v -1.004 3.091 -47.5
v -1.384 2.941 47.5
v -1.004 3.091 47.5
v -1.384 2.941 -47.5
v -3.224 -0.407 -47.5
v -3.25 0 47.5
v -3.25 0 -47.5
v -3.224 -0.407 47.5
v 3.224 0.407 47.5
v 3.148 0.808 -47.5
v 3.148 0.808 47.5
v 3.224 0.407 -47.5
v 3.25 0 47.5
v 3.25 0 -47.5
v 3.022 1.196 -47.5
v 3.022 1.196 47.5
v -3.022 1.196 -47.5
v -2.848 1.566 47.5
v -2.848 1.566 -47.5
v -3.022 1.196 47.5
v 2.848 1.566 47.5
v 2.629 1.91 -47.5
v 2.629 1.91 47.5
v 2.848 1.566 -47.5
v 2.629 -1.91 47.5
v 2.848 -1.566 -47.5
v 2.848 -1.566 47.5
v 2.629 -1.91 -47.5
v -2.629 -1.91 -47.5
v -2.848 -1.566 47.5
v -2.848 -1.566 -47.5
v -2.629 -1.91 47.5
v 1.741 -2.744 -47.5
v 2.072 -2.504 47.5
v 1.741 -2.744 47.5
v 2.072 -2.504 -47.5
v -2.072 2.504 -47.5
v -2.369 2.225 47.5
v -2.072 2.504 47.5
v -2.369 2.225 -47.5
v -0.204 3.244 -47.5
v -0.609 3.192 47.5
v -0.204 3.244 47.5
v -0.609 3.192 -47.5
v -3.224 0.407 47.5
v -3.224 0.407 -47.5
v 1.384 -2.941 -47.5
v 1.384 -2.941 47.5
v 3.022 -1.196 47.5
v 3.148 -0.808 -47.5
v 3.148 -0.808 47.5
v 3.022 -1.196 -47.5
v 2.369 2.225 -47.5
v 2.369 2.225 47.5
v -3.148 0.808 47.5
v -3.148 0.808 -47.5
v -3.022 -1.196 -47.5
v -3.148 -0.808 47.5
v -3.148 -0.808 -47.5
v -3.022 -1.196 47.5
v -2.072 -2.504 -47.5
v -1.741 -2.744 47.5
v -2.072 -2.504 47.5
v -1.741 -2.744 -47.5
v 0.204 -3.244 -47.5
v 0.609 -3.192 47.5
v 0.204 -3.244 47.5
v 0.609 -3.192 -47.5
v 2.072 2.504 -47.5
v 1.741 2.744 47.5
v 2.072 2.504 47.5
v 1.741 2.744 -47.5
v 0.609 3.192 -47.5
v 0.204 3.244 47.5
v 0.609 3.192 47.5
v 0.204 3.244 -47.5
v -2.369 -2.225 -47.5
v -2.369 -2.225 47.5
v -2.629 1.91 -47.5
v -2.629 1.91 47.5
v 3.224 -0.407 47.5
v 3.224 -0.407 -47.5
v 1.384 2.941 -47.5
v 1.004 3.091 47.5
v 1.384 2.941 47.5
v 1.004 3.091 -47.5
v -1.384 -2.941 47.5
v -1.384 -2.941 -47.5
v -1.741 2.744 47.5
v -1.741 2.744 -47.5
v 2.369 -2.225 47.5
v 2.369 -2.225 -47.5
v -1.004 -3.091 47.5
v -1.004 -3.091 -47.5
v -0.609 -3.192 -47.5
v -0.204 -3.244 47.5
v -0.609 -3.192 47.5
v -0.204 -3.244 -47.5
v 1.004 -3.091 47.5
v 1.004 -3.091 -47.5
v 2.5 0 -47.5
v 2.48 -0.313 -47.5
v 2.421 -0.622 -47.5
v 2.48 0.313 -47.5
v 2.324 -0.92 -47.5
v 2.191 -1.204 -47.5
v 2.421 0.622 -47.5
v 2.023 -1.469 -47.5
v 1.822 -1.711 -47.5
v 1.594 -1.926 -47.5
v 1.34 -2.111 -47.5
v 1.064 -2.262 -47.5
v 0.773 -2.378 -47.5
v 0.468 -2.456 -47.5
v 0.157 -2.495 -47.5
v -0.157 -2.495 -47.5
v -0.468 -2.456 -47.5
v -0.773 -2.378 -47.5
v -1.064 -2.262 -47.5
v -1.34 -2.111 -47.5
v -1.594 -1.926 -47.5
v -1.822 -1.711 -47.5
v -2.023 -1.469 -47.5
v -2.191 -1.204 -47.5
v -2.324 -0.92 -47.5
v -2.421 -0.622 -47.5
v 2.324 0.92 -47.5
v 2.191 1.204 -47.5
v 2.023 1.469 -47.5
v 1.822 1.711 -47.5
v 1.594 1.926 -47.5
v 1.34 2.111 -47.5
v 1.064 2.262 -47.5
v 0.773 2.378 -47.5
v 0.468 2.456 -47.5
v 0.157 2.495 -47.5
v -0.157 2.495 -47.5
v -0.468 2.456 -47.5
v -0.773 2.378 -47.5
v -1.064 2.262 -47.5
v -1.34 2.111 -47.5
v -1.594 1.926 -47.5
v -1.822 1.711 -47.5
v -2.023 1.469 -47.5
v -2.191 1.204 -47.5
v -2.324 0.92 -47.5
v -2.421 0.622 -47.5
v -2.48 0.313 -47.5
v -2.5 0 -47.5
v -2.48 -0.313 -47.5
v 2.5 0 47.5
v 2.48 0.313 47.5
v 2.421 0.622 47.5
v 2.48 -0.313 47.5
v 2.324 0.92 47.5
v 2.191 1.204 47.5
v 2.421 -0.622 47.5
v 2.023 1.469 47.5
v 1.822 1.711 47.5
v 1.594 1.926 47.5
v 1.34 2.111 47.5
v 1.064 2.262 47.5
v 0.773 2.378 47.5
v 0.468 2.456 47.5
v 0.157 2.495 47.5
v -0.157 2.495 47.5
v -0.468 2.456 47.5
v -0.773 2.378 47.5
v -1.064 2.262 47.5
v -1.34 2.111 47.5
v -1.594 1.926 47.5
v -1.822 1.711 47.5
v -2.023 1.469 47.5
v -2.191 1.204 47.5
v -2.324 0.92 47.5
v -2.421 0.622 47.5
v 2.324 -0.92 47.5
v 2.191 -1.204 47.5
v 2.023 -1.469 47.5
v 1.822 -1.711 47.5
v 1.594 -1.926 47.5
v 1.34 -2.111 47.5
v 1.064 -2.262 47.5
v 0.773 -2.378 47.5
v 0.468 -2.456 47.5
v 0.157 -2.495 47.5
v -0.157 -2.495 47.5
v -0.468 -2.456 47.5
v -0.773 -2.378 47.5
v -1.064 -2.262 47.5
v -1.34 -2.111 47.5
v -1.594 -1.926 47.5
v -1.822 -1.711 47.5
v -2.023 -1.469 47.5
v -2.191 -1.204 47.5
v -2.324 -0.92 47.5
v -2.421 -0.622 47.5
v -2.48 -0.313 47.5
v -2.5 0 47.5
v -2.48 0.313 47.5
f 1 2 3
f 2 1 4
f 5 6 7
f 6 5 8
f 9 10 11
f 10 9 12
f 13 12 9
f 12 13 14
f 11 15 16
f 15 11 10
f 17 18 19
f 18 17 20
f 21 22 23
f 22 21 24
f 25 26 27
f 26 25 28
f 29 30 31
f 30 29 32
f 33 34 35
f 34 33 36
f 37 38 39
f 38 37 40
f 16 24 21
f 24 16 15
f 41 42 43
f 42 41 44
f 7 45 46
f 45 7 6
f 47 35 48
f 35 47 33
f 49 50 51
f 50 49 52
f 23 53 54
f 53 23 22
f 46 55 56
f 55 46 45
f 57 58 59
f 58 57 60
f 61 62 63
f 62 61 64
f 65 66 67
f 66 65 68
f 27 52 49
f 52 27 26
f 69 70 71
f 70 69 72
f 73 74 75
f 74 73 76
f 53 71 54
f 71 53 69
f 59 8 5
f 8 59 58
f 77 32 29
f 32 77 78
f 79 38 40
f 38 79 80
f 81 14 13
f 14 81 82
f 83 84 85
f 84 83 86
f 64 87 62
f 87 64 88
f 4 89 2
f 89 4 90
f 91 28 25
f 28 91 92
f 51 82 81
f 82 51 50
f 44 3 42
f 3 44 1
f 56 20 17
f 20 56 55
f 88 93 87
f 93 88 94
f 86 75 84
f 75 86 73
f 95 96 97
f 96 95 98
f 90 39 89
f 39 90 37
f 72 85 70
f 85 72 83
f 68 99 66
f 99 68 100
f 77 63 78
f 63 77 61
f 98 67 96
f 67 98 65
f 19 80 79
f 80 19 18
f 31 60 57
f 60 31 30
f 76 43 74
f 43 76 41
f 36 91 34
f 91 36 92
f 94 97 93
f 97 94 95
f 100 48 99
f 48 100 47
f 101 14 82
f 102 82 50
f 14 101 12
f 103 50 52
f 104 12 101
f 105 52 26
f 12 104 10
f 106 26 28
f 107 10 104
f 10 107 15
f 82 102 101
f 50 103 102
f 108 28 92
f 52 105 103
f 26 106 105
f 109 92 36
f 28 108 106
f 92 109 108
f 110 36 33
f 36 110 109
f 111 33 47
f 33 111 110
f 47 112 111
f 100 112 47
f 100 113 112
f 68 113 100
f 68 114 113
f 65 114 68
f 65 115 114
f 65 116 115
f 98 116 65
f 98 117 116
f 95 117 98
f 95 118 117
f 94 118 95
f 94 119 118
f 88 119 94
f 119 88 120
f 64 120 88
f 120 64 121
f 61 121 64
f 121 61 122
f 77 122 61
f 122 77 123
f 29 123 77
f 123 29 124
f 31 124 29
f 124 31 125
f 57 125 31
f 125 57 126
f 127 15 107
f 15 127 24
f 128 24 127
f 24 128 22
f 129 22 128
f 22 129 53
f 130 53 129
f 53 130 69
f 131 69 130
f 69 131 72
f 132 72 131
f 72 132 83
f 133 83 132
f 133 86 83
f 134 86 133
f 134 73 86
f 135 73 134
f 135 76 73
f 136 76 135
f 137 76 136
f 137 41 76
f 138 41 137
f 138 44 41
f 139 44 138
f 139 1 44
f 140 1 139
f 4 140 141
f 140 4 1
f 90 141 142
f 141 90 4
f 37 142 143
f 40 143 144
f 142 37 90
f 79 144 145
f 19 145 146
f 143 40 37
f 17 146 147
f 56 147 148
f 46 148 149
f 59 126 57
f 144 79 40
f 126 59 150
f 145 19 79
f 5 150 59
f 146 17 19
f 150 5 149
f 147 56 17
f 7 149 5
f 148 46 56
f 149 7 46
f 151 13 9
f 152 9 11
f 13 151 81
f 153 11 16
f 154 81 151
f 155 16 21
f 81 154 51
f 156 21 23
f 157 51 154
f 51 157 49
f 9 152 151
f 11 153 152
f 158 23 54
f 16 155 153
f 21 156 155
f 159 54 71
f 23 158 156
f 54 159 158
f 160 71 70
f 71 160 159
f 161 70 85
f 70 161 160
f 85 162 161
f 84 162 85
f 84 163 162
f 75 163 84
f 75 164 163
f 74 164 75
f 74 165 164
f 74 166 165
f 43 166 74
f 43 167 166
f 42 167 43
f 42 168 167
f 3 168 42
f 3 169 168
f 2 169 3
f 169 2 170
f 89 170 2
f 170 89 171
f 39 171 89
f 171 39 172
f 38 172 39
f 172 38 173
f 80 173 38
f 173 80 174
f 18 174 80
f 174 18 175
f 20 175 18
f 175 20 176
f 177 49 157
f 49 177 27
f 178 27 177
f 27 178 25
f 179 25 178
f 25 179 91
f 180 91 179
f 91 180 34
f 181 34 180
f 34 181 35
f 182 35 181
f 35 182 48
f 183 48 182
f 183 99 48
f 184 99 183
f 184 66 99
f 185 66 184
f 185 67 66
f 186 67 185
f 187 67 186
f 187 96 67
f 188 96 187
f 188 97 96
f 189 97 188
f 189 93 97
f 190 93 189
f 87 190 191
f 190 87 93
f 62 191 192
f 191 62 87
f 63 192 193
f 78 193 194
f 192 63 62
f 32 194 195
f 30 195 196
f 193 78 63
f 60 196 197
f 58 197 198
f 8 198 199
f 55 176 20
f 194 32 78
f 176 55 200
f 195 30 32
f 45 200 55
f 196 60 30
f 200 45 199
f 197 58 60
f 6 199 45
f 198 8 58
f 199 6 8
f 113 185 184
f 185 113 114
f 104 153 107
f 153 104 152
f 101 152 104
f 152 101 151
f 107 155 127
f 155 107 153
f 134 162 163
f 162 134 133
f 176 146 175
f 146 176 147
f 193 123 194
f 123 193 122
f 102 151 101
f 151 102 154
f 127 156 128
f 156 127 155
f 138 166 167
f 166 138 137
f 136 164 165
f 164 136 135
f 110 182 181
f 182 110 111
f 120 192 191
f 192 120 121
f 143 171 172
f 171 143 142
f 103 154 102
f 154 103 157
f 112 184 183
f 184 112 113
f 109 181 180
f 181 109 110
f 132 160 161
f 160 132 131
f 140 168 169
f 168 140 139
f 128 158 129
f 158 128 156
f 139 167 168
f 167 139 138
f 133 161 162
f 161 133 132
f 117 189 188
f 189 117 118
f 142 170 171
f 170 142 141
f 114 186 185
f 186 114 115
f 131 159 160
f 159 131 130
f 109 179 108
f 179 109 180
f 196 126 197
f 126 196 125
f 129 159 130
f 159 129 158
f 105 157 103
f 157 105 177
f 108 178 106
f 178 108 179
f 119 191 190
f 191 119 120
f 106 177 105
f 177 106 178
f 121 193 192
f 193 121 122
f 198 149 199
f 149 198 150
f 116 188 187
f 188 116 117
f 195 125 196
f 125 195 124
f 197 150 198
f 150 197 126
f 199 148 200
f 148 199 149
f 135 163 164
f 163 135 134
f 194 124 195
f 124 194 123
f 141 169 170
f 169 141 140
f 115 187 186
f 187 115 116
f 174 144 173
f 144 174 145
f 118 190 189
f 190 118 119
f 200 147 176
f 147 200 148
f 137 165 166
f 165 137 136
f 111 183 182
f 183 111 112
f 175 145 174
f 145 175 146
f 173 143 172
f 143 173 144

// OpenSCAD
$fn = 50;


difference() {
	union() {
		translate(v = [0, 0, -47.5000000000]) {
			cylinder(h = 95, r = 3.2500000000);
		}
	}
	union() {
		translate(v = [0, 0, -100.0000000000]) {
			cylinder(h = 200, r = 2.5000000000);
		}
	}
}
